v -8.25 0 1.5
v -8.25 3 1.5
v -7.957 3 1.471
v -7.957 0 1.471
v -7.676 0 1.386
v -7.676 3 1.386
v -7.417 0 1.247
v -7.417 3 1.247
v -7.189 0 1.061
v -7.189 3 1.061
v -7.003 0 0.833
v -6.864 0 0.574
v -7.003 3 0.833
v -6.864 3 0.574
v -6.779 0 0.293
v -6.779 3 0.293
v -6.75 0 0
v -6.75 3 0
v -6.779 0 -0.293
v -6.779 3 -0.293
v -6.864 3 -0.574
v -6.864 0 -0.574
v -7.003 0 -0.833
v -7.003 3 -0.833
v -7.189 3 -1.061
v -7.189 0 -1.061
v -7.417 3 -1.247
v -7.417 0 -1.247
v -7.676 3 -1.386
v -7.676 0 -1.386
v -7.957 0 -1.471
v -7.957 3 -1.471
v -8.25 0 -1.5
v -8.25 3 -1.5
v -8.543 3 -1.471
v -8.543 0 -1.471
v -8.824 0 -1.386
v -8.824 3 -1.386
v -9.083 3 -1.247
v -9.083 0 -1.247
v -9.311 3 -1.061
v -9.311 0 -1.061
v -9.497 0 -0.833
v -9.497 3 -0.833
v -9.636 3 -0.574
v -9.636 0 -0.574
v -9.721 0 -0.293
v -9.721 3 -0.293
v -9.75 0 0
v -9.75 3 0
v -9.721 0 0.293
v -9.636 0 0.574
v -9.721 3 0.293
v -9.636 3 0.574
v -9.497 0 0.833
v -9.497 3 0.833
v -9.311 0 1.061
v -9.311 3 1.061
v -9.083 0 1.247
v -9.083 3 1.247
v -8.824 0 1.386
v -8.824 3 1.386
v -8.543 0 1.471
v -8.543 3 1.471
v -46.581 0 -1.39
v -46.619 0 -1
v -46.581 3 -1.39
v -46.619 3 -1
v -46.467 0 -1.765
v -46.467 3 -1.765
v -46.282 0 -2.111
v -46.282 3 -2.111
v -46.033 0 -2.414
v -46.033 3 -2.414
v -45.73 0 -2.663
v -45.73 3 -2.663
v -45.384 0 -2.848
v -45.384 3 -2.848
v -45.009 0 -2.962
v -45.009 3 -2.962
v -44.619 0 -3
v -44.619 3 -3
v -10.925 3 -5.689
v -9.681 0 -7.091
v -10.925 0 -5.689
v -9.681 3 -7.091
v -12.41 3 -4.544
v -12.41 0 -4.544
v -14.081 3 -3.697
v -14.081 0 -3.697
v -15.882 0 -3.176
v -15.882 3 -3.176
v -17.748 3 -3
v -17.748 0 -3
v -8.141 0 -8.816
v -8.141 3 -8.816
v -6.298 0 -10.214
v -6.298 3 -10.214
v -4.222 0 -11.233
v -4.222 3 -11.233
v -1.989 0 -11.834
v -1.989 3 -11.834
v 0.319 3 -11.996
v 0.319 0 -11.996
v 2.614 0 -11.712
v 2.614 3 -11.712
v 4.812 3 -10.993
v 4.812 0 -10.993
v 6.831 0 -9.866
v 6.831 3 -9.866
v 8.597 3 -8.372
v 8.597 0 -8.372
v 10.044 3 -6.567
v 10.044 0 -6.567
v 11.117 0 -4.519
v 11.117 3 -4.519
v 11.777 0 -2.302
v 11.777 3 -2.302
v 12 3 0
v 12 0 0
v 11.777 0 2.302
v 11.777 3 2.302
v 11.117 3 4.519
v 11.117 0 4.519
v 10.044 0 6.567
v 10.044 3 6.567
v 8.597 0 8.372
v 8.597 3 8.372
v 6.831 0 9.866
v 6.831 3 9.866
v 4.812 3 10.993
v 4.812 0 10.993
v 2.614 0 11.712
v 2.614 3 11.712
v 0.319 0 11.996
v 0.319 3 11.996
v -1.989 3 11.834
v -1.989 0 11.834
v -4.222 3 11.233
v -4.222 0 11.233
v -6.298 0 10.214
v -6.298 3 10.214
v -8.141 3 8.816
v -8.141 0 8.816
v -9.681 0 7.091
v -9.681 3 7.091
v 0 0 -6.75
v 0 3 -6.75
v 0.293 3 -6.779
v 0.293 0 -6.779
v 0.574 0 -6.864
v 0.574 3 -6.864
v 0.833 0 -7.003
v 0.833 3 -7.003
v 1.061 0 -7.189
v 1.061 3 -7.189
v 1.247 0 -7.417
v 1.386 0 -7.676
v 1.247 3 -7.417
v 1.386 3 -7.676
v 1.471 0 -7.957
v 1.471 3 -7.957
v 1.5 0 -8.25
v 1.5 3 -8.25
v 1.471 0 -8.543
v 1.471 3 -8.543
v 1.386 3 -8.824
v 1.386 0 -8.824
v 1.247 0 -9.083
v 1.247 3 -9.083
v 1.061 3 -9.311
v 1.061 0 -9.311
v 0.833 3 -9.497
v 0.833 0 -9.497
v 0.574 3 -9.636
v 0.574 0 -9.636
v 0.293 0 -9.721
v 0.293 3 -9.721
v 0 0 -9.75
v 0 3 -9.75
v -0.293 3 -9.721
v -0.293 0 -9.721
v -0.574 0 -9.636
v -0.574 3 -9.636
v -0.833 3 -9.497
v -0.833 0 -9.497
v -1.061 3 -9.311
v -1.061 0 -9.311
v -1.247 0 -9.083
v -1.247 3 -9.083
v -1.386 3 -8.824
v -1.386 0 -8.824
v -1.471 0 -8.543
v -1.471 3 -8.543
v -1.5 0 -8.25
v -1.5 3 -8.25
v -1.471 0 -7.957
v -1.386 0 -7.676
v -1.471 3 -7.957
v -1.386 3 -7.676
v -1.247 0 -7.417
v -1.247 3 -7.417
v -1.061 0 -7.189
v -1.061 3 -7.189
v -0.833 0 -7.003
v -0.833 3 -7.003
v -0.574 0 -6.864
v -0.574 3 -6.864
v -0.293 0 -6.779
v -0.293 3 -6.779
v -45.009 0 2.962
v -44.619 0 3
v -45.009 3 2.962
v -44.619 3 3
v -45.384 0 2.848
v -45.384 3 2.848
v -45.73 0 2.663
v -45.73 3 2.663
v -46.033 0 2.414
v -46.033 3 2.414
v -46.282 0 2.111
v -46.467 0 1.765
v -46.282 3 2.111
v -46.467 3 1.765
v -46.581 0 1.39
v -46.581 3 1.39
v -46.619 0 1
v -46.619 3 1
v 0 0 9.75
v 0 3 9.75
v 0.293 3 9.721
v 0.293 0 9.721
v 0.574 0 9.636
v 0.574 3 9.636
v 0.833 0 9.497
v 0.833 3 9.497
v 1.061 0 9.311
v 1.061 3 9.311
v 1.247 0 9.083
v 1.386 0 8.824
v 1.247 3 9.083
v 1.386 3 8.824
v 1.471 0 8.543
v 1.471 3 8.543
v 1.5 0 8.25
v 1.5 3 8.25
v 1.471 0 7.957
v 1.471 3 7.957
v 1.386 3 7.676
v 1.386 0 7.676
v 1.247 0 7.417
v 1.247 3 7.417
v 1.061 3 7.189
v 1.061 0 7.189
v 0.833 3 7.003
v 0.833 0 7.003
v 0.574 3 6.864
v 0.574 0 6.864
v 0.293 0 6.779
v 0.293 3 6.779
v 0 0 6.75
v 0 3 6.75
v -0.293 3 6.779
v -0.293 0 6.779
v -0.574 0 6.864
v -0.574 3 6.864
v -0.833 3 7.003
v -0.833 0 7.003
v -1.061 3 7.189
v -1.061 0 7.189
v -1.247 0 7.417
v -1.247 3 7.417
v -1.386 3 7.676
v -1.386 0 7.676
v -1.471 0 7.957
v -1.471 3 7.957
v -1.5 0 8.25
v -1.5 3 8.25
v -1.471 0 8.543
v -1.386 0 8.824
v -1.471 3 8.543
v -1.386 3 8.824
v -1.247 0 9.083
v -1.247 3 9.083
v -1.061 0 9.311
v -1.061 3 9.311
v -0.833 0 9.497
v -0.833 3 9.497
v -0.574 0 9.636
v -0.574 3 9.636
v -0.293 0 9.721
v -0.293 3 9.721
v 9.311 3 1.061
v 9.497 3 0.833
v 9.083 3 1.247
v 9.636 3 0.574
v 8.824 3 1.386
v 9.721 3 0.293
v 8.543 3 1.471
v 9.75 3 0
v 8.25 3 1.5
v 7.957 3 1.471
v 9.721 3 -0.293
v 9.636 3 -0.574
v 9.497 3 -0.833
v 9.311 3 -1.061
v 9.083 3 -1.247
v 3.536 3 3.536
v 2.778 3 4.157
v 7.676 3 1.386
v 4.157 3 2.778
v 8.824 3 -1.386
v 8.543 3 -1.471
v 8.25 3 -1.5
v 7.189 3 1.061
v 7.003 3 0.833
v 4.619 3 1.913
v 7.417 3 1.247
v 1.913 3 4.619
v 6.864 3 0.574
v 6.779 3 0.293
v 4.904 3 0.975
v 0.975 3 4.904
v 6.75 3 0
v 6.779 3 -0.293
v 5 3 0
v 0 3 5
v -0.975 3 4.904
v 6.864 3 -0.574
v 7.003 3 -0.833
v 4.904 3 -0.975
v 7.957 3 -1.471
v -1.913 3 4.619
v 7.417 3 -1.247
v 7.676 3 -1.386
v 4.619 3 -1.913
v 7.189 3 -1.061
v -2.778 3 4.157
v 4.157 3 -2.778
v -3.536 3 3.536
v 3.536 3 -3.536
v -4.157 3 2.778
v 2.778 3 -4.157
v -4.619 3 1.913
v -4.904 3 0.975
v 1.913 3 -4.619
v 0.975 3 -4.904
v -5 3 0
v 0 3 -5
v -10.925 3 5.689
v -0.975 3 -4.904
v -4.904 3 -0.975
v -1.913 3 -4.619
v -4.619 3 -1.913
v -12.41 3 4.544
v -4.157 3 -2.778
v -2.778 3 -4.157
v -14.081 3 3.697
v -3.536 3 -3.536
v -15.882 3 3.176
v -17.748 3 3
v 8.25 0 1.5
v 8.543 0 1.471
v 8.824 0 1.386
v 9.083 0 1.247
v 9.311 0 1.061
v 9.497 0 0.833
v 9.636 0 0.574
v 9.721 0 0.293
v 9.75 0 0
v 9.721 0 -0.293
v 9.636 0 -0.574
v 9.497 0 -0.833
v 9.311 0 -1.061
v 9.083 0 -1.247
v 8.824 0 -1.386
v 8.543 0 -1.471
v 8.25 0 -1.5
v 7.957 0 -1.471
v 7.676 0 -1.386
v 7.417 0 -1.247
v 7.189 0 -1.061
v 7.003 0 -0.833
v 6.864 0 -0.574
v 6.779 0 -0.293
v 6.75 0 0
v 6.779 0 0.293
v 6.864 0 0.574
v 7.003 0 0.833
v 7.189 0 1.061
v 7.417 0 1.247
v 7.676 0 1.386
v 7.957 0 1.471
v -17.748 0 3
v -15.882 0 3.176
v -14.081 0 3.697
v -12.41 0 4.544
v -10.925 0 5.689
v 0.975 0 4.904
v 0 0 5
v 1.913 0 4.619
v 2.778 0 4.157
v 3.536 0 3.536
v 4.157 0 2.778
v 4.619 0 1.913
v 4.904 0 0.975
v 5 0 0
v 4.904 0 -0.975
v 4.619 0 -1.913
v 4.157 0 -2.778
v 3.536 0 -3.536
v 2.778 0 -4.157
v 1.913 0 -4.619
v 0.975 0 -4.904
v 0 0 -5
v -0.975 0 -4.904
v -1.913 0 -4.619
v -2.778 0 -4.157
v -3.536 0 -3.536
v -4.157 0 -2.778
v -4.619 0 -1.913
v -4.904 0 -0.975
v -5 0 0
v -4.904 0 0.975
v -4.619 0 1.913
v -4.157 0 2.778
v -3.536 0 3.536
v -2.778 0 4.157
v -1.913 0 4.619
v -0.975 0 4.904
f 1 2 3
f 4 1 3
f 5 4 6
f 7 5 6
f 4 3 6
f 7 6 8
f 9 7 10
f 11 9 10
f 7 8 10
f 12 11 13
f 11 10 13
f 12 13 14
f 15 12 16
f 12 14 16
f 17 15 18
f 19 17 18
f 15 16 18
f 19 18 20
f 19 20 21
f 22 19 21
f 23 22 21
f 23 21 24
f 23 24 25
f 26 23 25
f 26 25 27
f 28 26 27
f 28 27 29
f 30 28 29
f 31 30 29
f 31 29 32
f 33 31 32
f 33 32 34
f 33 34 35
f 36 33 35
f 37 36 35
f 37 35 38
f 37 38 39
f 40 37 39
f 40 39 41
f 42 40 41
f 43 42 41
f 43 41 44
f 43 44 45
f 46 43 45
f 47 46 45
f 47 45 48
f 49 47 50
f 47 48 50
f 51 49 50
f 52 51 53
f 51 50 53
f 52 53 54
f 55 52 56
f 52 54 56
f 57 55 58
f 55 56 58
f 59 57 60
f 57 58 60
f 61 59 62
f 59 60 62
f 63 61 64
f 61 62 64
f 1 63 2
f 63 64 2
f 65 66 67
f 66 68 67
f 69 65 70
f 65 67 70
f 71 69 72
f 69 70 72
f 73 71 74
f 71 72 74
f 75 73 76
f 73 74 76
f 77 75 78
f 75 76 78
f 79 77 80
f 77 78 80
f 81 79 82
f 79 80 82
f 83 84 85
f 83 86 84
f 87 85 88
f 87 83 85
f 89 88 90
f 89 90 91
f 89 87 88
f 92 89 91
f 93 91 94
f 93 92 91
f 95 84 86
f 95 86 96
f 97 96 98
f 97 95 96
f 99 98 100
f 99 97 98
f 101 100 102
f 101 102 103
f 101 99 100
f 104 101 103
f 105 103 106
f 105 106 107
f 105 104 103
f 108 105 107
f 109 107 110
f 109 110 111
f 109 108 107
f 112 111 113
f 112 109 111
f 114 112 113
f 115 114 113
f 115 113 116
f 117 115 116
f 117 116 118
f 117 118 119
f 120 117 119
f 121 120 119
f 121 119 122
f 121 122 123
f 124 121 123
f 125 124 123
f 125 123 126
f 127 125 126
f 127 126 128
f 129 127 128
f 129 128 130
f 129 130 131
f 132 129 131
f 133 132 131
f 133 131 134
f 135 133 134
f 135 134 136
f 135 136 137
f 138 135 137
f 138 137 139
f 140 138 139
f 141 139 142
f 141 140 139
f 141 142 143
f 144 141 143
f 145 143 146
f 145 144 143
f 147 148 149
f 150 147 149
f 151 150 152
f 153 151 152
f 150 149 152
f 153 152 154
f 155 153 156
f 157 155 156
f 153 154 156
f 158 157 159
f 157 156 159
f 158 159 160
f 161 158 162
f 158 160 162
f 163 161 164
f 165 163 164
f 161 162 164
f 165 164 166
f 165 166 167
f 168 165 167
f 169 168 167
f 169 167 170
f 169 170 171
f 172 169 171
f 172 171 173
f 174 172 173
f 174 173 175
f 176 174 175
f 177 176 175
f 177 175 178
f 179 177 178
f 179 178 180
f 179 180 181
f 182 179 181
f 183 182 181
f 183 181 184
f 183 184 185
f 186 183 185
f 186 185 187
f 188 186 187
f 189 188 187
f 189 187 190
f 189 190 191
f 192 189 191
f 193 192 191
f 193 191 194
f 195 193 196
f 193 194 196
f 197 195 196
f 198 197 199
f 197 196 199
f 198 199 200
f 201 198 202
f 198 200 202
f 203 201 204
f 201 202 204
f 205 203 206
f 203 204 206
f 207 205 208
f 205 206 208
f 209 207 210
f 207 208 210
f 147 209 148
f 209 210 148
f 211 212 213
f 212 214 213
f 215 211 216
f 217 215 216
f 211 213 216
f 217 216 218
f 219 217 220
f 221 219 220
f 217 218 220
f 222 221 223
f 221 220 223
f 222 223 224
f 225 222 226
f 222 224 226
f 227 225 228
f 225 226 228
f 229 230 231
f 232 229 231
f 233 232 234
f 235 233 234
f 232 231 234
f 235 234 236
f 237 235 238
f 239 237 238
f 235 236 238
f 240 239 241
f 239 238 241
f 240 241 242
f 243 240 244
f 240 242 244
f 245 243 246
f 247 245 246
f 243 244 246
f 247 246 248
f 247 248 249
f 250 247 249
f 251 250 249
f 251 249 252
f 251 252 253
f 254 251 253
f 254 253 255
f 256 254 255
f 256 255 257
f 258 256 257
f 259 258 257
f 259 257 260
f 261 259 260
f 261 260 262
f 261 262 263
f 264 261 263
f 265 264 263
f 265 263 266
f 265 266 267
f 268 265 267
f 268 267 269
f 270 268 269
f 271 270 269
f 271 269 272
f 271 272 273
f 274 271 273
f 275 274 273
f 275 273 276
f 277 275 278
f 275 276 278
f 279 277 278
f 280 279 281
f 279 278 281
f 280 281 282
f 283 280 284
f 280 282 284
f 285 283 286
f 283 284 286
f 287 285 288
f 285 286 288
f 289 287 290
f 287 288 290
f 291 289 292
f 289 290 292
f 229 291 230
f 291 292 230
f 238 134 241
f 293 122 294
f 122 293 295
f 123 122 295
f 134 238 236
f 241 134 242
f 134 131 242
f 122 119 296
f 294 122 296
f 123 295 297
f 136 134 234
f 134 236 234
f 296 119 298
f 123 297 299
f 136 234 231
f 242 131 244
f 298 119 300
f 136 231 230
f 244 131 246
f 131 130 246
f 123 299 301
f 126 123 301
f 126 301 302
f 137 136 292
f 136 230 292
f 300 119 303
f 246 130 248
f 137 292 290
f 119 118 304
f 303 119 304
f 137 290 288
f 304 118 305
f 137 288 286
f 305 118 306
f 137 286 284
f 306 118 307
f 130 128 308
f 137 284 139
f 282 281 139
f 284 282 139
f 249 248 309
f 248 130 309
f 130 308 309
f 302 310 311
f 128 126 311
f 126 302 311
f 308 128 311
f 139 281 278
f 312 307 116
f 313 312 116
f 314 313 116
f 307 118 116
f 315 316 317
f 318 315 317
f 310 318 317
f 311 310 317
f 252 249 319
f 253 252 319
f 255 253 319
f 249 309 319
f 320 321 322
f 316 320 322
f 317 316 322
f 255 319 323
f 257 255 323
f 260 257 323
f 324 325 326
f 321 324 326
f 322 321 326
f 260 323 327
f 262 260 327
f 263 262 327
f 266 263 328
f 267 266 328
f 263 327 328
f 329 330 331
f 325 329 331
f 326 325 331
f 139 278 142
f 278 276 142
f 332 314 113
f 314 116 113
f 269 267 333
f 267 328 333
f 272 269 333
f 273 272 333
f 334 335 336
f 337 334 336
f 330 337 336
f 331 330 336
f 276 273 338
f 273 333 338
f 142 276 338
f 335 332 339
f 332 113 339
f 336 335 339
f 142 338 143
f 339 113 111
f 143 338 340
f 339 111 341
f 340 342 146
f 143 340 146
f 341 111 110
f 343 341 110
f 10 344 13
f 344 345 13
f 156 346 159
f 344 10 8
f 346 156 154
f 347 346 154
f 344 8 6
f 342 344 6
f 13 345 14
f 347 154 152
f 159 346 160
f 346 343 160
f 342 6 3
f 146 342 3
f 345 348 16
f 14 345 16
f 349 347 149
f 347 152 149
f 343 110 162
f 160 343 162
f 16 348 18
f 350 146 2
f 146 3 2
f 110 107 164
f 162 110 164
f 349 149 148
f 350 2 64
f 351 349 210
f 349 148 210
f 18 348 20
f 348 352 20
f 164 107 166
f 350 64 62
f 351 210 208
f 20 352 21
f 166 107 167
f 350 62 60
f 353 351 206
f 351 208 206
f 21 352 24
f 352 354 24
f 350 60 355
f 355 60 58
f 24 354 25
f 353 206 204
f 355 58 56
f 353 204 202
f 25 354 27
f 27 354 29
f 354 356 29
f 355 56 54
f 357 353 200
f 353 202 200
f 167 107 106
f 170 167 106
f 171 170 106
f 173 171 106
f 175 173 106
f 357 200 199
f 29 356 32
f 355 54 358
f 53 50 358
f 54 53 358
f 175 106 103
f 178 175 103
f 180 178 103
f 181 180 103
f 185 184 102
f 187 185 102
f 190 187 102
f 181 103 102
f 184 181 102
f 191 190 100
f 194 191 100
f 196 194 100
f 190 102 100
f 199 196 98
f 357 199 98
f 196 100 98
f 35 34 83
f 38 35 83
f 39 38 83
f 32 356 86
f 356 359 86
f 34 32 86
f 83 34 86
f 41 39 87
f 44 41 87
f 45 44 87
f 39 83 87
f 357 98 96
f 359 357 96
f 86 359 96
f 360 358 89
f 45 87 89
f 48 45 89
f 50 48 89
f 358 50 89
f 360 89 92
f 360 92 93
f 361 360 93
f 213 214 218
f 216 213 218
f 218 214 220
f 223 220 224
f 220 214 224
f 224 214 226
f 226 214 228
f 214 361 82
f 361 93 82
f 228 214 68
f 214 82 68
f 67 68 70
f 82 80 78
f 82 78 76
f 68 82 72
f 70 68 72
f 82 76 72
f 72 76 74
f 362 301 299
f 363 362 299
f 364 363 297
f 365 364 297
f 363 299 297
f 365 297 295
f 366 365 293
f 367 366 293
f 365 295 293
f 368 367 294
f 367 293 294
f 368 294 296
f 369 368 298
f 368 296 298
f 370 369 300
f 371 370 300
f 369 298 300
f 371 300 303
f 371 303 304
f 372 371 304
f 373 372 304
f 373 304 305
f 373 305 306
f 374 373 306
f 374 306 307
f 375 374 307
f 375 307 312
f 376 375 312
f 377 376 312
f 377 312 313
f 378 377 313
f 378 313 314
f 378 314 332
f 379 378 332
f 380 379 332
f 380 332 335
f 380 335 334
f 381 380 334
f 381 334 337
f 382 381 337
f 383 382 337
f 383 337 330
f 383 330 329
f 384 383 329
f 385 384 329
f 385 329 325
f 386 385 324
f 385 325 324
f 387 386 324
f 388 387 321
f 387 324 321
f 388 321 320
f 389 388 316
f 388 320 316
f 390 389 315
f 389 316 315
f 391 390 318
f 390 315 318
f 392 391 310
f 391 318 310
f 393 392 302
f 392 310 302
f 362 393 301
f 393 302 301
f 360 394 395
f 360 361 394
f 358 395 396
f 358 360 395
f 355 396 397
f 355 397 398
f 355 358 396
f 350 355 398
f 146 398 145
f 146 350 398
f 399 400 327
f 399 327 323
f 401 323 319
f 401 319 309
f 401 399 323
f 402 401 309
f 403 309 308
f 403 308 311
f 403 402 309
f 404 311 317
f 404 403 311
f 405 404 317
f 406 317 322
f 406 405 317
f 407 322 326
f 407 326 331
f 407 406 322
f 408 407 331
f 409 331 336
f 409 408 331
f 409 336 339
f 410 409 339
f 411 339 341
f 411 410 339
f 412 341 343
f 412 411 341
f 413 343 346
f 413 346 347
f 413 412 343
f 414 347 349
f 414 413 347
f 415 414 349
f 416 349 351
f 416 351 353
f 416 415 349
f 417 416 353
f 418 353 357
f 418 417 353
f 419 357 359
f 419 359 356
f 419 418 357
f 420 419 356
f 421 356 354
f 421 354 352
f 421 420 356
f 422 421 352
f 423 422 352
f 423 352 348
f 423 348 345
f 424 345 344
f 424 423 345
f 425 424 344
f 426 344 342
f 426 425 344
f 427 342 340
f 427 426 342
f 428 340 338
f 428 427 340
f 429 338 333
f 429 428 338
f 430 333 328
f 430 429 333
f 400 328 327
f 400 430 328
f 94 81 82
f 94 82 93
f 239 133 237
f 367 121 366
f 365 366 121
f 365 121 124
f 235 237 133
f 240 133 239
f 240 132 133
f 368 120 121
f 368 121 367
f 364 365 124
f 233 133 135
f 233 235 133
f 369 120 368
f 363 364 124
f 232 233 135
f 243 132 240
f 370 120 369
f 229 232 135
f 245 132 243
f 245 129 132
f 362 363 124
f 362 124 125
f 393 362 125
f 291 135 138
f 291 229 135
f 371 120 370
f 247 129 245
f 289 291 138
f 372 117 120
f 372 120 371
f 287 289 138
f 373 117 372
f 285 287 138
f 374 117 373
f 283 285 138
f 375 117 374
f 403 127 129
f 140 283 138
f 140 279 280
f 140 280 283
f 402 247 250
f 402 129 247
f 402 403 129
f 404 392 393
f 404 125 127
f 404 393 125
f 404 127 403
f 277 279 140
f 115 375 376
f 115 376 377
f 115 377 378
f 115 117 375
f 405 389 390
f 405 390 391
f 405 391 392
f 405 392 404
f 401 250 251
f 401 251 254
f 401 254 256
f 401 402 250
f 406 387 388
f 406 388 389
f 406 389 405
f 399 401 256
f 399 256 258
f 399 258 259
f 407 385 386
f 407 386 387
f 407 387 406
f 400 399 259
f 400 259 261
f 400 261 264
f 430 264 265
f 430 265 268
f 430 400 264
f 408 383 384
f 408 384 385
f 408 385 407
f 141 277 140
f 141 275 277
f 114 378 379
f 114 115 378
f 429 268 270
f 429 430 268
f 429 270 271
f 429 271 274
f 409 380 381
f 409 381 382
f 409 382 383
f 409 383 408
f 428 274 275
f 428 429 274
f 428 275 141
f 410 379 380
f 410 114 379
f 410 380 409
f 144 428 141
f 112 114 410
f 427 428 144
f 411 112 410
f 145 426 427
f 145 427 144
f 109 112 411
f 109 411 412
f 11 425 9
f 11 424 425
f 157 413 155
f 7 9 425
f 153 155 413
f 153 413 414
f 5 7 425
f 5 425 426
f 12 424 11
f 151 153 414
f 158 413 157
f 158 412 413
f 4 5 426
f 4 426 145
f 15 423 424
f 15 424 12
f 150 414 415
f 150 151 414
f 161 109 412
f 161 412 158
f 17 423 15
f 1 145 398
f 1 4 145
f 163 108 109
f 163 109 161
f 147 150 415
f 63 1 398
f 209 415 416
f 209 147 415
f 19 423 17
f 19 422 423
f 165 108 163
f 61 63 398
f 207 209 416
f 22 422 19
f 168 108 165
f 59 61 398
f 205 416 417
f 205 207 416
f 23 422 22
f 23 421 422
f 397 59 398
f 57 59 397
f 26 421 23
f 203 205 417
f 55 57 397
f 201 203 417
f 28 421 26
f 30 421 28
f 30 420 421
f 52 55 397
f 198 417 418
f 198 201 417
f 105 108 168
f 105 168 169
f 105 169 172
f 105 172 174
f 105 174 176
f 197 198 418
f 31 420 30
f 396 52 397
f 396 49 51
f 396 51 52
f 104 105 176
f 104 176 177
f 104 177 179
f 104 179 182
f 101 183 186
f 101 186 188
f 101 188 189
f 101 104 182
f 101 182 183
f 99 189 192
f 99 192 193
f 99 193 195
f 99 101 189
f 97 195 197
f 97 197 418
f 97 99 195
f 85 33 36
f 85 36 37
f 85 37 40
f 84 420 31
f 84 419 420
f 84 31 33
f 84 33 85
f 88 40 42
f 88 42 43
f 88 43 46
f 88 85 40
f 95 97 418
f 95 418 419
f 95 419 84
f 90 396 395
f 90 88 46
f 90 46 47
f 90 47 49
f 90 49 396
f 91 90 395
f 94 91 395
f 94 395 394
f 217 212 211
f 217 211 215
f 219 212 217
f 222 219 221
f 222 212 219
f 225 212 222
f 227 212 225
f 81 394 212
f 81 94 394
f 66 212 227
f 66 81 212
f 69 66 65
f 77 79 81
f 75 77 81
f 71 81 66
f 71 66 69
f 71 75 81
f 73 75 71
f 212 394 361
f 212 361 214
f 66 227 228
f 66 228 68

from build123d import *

# Parameters (mm, degrees)
SKETCH_1_R          = 5
EXTRUDE_1_DEPTH     = 3
SKETCH_2_R          = 1.5
CUT_EXTRUDE_1_DEPTH = 49.232007036
FILLET_1_R          = 2
FILLET_2_R          = 10


with BuildPart() as part:
    # 草图1 → 凸台-拉伸1 (new body)
    with BuildSketch(Plane(origin=(0, 0, 0), x_dir=(1, 0, 0), z_dir=(0, 1, 0))):
        with BuildLine():
            Line((-11.618950039, -3), (-46.618950039, -3))
            Line((-46.618950039, -3), (-46.618950039, 3))
            Line((-46.618950039, 3), (-11.618950039, 3))
            ThreePointArc((-11.618950039, 3), (12, 0), (-11.618950039, -3))
        make_face()
        with Locations(Location((0, 0, 0), (0, 0, 270))):
            Circle(SKETCH_1_R, mode=Mode.SUBTRACT)
    extrude(amount=EXTRUDE_1_DEPTH)

    # 草图2 → 切除-拉伸1 (cut, through all)
    with BuildSketch(Plane(origin=(0, 3, 0), x_dir=(1, 0, 0), z_dir=(0, 1, 0))):
        with Locations(Location((0, 8.25, 0), (0, 0, 270))):
            Circle(SKETCH_2_R)
        with Locations(Location((8.25, 0, 0), (0, 0, 270))):
            Circle(SKETCH_2_R)
        with Locations(Location((0, -8.25, 0), (0, 0, 270))):
            Circle(SKETCH_2_R)
        with Locations(Location((-8.25, 0, 0), (0, 0, 270))):
            Circle(SKETCH_2_R)
    extrude(amount=-CUT_EXTRUDE_1_DEPTH, mode=Mode.SUBTRACT)

    # 圆角1
    fillet_1_edges = [part.edges().sort_by_distance(p)[0] for p in [
        (-46.618950039, 1.5, 3),
        (-46.618950039, 1.5, -3),
    ]]
    fillet(fillet_1_edges, radius=FILLET_1_R)

    # 圆角2
    fillet_2_edges = [part.edges().sort_by_distance(p)[0] for p in [
        (-11.618950039, 1.5, 3),
        (-11.618950039, 1.5, -3),
    ]]
    fillet(fillet_2_edges, radius=FILLET_2_R)


solid = part.part
